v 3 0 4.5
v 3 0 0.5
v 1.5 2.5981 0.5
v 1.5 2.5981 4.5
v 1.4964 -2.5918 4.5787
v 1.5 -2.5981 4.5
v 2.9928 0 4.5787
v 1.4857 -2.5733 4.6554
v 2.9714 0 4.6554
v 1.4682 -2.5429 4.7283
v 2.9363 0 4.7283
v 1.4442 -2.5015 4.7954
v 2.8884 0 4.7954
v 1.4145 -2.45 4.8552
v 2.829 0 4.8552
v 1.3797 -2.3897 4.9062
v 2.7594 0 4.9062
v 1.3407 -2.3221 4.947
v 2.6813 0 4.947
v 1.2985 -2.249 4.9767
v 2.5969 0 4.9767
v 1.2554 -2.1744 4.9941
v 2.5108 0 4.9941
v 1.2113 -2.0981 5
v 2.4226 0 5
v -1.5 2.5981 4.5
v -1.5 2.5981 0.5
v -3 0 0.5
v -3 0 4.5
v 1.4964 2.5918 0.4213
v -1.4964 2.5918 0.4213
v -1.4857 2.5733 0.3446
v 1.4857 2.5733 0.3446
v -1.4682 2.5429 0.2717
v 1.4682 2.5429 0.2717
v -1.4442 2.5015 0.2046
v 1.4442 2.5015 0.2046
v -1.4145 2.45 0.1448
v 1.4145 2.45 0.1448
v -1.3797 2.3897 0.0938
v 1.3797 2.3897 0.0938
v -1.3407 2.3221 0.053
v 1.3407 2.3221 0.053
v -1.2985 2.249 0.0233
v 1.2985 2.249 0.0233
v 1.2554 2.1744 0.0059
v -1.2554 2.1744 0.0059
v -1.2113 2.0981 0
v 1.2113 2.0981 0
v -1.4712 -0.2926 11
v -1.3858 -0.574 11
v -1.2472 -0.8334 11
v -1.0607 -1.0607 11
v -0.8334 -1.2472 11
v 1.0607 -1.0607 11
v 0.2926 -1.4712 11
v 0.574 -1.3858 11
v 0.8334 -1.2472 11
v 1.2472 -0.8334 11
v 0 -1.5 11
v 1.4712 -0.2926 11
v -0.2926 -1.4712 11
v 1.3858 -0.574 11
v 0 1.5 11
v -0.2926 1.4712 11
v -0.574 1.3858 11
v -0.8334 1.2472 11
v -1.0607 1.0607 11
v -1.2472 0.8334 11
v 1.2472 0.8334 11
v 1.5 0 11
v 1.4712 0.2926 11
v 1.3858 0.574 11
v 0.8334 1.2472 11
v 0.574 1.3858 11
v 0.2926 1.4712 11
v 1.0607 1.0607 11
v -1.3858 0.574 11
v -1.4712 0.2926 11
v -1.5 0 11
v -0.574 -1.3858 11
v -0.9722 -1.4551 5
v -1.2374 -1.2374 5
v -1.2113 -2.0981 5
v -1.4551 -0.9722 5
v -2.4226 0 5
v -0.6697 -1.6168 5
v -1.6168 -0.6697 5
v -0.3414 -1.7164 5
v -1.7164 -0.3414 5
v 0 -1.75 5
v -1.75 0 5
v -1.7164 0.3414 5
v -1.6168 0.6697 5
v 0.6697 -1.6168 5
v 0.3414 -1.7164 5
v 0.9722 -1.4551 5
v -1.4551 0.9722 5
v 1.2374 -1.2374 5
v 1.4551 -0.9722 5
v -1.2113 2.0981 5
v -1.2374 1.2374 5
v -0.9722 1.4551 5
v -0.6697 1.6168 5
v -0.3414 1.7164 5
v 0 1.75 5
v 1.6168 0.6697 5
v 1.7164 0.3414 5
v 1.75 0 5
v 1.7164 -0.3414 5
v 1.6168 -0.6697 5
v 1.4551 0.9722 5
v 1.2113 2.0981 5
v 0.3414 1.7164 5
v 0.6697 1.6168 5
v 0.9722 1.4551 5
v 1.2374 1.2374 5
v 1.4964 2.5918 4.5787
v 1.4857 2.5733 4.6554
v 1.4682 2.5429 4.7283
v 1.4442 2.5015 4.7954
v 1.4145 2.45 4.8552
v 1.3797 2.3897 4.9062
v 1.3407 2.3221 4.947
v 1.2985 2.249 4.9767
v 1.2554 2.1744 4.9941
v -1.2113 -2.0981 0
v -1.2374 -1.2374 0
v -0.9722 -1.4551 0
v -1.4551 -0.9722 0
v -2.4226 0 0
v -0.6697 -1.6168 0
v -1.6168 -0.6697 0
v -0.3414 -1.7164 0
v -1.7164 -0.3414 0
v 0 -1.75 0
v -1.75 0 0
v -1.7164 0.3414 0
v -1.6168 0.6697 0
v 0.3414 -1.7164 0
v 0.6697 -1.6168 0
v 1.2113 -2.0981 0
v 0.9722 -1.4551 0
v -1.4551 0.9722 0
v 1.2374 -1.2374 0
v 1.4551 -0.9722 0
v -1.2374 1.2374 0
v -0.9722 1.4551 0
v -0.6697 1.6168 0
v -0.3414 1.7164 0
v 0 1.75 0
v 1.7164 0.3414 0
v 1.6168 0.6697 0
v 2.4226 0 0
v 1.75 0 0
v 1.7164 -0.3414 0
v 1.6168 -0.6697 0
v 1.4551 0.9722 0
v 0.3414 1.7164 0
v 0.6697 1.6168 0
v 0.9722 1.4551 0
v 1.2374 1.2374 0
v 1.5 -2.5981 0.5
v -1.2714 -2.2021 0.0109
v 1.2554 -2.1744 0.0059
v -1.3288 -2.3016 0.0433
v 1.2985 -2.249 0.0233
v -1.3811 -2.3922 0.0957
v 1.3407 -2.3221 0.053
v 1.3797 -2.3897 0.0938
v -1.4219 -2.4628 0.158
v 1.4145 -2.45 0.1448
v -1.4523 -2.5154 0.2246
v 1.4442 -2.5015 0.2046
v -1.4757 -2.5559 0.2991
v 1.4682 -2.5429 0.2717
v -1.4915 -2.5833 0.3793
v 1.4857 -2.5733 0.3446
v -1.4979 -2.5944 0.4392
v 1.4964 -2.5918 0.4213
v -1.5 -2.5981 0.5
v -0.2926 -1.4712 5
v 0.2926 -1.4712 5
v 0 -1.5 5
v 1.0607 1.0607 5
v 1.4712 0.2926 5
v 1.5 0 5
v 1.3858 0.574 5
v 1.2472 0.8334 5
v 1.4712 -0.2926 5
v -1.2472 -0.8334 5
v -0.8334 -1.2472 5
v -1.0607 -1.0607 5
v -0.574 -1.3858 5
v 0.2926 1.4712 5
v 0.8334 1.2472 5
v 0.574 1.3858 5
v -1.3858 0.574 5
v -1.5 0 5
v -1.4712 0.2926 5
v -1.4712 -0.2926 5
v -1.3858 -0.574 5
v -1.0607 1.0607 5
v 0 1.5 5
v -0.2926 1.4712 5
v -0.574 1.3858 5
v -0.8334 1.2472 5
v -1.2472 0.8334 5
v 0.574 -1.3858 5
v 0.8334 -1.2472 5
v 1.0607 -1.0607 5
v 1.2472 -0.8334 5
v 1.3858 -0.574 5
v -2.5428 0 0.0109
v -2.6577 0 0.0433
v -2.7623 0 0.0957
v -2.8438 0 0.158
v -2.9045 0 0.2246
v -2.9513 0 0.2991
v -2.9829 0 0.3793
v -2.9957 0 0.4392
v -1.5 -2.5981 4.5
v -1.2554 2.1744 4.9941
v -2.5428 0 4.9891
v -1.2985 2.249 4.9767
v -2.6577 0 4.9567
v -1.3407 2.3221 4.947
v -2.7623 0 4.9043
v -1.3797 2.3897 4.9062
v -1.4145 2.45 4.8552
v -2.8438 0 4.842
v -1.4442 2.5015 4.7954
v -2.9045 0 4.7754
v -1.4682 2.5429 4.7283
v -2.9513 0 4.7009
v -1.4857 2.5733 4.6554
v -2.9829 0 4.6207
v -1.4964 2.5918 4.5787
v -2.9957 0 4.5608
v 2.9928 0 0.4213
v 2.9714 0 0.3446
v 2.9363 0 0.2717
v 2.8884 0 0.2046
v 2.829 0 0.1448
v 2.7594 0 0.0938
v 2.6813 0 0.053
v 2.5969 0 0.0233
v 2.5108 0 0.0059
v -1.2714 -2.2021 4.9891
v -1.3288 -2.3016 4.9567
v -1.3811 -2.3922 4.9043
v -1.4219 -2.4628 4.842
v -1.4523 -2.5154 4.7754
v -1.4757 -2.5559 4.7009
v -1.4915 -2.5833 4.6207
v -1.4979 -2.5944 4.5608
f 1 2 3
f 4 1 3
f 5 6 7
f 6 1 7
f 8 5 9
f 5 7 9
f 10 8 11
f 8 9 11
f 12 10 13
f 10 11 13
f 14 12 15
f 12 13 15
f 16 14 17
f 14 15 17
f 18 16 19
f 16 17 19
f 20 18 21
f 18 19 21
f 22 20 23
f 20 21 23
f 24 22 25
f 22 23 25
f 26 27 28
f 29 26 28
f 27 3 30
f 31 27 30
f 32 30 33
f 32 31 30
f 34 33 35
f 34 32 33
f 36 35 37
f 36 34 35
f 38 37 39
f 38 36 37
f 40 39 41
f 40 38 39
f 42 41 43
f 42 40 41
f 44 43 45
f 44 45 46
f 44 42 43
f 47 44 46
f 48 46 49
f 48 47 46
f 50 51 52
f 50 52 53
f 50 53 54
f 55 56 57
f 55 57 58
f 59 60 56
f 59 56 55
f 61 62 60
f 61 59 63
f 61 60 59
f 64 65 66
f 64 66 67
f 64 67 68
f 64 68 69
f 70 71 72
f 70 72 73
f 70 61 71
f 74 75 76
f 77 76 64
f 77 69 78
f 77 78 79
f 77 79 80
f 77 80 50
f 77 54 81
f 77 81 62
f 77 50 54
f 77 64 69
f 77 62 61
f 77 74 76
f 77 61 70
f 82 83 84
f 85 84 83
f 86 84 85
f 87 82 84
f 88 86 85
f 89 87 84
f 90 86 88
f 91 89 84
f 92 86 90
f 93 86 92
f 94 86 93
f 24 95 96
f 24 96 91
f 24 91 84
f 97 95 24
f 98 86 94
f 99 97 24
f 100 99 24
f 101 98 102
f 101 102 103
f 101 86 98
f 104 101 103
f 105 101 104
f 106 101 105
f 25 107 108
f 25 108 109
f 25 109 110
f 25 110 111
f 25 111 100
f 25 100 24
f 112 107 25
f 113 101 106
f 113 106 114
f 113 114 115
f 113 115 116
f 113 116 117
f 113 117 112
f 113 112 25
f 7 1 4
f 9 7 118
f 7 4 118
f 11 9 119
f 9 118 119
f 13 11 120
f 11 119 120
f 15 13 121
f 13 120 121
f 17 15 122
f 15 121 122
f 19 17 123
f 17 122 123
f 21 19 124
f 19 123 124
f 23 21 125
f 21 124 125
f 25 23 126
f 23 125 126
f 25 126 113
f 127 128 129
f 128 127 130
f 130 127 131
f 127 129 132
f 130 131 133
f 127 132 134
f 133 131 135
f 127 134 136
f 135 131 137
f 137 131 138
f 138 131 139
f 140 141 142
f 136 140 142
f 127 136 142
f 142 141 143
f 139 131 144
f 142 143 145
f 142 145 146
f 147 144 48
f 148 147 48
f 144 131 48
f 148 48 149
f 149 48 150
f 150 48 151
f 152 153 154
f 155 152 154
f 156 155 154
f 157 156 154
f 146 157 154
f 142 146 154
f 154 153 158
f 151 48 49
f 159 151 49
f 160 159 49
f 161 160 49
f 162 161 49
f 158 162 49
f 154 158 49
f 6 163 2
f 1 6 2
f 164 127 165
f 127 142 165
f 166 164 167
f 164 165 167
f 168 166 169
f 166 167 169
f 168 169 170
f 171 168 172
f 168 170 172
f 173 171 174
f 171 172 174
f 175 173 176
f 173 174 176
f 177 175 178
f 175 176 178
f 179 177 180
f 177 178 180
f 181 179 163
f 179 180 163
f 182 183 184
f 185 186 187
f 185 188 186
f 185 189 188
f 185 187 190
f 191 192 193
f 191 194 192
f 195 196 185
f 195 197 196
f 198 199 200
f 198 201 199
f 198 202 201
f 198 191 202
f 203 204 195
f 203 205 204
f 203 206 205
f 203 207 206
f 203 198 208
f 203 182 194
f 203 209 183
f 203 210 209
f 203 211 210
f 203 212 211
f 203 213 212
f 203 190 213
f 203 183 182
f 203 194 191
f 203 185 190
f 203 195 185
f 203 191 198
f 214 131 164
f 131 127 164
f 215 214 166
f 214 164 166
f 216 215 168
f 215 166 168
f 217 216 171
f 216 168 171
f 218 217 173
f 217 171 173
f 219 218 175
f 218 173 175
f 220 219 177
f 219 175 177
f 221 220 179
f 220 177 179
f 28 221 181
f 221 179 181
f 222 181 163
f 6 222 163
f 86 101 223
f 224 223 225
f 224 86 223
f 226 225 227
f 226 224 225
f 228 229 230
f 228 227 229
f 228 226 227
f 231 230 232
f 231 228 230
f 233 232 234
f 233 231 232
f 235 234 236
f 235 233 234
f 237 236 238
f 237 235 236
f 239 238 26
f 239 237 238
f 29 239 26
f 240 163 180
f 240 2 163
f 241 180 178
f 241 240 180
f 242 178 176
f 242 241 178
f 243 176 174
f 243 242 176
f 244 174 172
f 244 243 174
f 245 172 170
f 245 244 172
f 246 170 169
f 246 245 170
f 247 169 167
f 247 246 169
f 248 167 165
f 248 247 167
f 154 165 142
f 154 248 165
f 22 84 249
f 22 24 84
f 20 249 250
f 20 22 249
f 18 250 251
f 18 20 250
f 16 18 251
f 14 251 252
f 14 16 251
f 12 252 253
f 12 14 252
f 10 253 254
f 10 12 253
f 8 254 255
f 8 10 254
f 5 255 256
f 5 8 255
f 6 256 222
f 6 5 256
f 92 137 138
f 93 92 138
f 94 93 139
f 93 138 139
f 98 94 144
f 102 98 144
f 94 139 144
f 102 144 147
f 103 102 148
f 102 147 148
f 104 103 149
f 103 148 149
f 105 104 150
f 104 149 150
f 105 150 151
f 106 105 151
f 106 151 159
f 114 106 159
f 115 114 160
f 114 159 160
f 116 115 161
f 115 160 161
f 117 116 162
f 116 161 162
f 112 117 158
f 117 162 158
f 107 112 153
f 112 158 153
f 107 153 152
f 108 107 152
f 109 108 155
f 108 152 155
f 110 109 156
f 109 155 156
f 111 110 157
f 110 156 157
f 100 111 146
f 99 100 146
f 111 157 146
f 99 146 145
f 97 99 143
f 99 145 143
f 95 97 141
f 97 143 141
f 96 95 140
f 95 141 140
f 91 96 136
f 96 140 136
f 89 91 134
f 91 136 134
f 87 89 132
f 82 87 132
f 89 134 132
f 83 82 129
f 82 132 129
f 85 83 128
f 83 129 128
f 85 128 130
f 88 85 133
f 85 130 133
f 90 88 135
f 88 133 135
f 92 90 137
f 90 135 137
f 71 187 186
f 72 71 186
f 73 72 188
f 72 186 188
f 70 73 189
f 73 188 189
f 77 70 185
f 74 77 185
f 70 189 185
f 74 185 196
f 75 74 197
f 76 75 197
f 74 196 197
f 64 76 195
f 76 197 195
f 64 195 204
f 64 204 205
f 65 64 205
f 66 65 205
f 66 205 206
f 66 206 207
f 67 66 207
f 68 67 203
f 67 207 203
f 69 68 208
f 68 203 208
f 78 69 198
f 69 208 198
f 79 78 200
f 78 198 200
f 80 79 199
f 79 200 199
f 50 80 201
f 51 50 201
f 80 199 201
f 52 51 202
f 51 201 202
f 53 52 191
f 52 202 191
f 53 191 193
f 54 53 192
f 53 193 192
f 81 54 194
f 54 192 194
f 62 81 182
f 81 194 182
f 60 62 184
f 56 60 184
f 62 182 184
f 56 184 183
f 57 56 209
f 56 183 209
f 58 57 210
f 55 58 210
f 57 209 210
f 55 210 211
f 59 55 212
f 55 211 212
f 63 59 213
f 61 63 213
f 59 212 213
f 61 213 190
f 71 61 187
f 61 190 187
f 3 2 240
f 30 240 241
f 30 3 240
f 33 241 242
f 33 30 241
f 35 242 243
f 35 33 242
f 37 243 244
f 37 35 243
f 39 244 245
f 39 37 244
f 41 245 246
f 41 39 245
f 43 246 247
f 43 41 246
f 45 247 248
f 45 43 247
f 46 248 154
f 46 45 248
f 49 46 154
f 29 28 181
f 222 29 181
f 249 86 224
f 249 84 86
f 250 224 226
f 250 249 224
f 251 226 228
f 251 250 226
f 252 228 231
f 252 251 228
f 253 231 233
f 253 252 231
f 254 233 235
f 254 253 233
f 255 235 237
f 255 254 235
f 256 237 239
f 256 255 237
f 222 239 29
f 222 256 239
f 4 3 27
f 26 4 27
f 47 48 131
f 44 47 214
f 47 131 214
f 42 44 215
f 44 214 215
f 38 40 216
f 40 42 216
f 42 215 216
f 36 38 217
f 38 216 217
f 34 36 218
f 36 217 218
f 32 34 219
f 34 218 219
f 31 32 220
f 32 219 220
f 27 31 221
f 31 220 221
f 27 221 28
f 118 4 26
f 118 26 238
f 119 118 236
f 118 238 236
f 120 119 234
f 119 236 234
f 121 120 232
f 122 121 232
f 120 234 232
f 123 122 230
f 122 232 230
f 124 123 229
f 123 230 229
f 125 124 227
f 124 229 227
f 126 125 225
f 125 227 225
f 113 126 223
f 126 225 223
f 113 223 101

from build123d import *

# Parameters (mm, degrees)
EXTRUDE_2_DEPTH     = 5
SKETCH_2_R          = 1.5
EXTRUDE_3_DEPTH     = 6
SKETCH_3_R          = 1.75
CUT_EXTRUDE_1_DEPTH = 5
FILLET_1_R          = 0.5


with BuildPart() as part:
    # ｽｹｯﾁ1 → ﾎﾞｽ - 押し出し2 (new body)
    with BuildSketch(Plane.XY):
        Polygon((3, 0), (1.5, 2.598076211), (-1.5, 2.598076211), (-3, 0), (-1.5, -2.598076211), (1.5, -2.598076211), align=None)
    extrude(amount=EXTRUDE_2_DEPTH)

    # ｽｹｯﾁ2 → ﾎﾞｽ - 押し出し3 (add)
    with BuildSketch(Plane.XY.offset(5)):
        Circle(SKETCH_2_R)
    extrude(amount=EXTRUDE_3_DEPTH)

    # ｽｹｯﾁ3 → ｶｯﾄ - 押し出し1 (cut)
    with BuildSketch(Plane(origin=(0, 0, 0), x_dir=(-1, 0, 0), z_dir=(0, 0, -1))):
        Circle(SKETCH_3_R)
    extrude(amount=-CUT_EXTRUDE_1_DEPTH, mode=Mode.SUBTRACT)


with BuildPart() as cut_extrude_1_piece_1:
    # of the separate pieces the step leaves, piece 1, a body of its own (cut_extrude_1_pieces)
    add(part.part.solids().sort_by_distance((3, 0, 0))[0])

    # ﾌｨﾚｯﾄ1
    fillet_1_edges = [cut_extrude_1_piece_1.edges().sort_by_distance(p)[0] for p in [
        (2.25, -1.299038106, 5),
        (2.25, 1.299038106, 5),
        (0, 2.598076211, 5),
        (-2.25, 1.299038106, 5),
        (-2.25, -1.299038106, 5),
        (0, -2.598076211, 5),
        (2.25, -1.299038106, 0),
        (2.25, 1.299038106, 0),
        (0, 2.598076211, 0),
        (-2.25, 1.299038106, 0),
        (-2.25, -1.299038106, 0),
        (0, -2.598076211, 0),
    ]]
    fillet(fillet_1_edges, radius=FILLET_1_R)


with BuildPart() as cut_extrude_1_piece_2:
    # of the separate pieces the step leaves, piece 2, a body of its own (cut_extrude_1_pieces)
    add(part.part.solids().sort_by_distance((1.5, 0, 5))[0])


solid = Compound([cut_extrude_1_piece_1.part, cut_extrude_1_piece_2.part])
